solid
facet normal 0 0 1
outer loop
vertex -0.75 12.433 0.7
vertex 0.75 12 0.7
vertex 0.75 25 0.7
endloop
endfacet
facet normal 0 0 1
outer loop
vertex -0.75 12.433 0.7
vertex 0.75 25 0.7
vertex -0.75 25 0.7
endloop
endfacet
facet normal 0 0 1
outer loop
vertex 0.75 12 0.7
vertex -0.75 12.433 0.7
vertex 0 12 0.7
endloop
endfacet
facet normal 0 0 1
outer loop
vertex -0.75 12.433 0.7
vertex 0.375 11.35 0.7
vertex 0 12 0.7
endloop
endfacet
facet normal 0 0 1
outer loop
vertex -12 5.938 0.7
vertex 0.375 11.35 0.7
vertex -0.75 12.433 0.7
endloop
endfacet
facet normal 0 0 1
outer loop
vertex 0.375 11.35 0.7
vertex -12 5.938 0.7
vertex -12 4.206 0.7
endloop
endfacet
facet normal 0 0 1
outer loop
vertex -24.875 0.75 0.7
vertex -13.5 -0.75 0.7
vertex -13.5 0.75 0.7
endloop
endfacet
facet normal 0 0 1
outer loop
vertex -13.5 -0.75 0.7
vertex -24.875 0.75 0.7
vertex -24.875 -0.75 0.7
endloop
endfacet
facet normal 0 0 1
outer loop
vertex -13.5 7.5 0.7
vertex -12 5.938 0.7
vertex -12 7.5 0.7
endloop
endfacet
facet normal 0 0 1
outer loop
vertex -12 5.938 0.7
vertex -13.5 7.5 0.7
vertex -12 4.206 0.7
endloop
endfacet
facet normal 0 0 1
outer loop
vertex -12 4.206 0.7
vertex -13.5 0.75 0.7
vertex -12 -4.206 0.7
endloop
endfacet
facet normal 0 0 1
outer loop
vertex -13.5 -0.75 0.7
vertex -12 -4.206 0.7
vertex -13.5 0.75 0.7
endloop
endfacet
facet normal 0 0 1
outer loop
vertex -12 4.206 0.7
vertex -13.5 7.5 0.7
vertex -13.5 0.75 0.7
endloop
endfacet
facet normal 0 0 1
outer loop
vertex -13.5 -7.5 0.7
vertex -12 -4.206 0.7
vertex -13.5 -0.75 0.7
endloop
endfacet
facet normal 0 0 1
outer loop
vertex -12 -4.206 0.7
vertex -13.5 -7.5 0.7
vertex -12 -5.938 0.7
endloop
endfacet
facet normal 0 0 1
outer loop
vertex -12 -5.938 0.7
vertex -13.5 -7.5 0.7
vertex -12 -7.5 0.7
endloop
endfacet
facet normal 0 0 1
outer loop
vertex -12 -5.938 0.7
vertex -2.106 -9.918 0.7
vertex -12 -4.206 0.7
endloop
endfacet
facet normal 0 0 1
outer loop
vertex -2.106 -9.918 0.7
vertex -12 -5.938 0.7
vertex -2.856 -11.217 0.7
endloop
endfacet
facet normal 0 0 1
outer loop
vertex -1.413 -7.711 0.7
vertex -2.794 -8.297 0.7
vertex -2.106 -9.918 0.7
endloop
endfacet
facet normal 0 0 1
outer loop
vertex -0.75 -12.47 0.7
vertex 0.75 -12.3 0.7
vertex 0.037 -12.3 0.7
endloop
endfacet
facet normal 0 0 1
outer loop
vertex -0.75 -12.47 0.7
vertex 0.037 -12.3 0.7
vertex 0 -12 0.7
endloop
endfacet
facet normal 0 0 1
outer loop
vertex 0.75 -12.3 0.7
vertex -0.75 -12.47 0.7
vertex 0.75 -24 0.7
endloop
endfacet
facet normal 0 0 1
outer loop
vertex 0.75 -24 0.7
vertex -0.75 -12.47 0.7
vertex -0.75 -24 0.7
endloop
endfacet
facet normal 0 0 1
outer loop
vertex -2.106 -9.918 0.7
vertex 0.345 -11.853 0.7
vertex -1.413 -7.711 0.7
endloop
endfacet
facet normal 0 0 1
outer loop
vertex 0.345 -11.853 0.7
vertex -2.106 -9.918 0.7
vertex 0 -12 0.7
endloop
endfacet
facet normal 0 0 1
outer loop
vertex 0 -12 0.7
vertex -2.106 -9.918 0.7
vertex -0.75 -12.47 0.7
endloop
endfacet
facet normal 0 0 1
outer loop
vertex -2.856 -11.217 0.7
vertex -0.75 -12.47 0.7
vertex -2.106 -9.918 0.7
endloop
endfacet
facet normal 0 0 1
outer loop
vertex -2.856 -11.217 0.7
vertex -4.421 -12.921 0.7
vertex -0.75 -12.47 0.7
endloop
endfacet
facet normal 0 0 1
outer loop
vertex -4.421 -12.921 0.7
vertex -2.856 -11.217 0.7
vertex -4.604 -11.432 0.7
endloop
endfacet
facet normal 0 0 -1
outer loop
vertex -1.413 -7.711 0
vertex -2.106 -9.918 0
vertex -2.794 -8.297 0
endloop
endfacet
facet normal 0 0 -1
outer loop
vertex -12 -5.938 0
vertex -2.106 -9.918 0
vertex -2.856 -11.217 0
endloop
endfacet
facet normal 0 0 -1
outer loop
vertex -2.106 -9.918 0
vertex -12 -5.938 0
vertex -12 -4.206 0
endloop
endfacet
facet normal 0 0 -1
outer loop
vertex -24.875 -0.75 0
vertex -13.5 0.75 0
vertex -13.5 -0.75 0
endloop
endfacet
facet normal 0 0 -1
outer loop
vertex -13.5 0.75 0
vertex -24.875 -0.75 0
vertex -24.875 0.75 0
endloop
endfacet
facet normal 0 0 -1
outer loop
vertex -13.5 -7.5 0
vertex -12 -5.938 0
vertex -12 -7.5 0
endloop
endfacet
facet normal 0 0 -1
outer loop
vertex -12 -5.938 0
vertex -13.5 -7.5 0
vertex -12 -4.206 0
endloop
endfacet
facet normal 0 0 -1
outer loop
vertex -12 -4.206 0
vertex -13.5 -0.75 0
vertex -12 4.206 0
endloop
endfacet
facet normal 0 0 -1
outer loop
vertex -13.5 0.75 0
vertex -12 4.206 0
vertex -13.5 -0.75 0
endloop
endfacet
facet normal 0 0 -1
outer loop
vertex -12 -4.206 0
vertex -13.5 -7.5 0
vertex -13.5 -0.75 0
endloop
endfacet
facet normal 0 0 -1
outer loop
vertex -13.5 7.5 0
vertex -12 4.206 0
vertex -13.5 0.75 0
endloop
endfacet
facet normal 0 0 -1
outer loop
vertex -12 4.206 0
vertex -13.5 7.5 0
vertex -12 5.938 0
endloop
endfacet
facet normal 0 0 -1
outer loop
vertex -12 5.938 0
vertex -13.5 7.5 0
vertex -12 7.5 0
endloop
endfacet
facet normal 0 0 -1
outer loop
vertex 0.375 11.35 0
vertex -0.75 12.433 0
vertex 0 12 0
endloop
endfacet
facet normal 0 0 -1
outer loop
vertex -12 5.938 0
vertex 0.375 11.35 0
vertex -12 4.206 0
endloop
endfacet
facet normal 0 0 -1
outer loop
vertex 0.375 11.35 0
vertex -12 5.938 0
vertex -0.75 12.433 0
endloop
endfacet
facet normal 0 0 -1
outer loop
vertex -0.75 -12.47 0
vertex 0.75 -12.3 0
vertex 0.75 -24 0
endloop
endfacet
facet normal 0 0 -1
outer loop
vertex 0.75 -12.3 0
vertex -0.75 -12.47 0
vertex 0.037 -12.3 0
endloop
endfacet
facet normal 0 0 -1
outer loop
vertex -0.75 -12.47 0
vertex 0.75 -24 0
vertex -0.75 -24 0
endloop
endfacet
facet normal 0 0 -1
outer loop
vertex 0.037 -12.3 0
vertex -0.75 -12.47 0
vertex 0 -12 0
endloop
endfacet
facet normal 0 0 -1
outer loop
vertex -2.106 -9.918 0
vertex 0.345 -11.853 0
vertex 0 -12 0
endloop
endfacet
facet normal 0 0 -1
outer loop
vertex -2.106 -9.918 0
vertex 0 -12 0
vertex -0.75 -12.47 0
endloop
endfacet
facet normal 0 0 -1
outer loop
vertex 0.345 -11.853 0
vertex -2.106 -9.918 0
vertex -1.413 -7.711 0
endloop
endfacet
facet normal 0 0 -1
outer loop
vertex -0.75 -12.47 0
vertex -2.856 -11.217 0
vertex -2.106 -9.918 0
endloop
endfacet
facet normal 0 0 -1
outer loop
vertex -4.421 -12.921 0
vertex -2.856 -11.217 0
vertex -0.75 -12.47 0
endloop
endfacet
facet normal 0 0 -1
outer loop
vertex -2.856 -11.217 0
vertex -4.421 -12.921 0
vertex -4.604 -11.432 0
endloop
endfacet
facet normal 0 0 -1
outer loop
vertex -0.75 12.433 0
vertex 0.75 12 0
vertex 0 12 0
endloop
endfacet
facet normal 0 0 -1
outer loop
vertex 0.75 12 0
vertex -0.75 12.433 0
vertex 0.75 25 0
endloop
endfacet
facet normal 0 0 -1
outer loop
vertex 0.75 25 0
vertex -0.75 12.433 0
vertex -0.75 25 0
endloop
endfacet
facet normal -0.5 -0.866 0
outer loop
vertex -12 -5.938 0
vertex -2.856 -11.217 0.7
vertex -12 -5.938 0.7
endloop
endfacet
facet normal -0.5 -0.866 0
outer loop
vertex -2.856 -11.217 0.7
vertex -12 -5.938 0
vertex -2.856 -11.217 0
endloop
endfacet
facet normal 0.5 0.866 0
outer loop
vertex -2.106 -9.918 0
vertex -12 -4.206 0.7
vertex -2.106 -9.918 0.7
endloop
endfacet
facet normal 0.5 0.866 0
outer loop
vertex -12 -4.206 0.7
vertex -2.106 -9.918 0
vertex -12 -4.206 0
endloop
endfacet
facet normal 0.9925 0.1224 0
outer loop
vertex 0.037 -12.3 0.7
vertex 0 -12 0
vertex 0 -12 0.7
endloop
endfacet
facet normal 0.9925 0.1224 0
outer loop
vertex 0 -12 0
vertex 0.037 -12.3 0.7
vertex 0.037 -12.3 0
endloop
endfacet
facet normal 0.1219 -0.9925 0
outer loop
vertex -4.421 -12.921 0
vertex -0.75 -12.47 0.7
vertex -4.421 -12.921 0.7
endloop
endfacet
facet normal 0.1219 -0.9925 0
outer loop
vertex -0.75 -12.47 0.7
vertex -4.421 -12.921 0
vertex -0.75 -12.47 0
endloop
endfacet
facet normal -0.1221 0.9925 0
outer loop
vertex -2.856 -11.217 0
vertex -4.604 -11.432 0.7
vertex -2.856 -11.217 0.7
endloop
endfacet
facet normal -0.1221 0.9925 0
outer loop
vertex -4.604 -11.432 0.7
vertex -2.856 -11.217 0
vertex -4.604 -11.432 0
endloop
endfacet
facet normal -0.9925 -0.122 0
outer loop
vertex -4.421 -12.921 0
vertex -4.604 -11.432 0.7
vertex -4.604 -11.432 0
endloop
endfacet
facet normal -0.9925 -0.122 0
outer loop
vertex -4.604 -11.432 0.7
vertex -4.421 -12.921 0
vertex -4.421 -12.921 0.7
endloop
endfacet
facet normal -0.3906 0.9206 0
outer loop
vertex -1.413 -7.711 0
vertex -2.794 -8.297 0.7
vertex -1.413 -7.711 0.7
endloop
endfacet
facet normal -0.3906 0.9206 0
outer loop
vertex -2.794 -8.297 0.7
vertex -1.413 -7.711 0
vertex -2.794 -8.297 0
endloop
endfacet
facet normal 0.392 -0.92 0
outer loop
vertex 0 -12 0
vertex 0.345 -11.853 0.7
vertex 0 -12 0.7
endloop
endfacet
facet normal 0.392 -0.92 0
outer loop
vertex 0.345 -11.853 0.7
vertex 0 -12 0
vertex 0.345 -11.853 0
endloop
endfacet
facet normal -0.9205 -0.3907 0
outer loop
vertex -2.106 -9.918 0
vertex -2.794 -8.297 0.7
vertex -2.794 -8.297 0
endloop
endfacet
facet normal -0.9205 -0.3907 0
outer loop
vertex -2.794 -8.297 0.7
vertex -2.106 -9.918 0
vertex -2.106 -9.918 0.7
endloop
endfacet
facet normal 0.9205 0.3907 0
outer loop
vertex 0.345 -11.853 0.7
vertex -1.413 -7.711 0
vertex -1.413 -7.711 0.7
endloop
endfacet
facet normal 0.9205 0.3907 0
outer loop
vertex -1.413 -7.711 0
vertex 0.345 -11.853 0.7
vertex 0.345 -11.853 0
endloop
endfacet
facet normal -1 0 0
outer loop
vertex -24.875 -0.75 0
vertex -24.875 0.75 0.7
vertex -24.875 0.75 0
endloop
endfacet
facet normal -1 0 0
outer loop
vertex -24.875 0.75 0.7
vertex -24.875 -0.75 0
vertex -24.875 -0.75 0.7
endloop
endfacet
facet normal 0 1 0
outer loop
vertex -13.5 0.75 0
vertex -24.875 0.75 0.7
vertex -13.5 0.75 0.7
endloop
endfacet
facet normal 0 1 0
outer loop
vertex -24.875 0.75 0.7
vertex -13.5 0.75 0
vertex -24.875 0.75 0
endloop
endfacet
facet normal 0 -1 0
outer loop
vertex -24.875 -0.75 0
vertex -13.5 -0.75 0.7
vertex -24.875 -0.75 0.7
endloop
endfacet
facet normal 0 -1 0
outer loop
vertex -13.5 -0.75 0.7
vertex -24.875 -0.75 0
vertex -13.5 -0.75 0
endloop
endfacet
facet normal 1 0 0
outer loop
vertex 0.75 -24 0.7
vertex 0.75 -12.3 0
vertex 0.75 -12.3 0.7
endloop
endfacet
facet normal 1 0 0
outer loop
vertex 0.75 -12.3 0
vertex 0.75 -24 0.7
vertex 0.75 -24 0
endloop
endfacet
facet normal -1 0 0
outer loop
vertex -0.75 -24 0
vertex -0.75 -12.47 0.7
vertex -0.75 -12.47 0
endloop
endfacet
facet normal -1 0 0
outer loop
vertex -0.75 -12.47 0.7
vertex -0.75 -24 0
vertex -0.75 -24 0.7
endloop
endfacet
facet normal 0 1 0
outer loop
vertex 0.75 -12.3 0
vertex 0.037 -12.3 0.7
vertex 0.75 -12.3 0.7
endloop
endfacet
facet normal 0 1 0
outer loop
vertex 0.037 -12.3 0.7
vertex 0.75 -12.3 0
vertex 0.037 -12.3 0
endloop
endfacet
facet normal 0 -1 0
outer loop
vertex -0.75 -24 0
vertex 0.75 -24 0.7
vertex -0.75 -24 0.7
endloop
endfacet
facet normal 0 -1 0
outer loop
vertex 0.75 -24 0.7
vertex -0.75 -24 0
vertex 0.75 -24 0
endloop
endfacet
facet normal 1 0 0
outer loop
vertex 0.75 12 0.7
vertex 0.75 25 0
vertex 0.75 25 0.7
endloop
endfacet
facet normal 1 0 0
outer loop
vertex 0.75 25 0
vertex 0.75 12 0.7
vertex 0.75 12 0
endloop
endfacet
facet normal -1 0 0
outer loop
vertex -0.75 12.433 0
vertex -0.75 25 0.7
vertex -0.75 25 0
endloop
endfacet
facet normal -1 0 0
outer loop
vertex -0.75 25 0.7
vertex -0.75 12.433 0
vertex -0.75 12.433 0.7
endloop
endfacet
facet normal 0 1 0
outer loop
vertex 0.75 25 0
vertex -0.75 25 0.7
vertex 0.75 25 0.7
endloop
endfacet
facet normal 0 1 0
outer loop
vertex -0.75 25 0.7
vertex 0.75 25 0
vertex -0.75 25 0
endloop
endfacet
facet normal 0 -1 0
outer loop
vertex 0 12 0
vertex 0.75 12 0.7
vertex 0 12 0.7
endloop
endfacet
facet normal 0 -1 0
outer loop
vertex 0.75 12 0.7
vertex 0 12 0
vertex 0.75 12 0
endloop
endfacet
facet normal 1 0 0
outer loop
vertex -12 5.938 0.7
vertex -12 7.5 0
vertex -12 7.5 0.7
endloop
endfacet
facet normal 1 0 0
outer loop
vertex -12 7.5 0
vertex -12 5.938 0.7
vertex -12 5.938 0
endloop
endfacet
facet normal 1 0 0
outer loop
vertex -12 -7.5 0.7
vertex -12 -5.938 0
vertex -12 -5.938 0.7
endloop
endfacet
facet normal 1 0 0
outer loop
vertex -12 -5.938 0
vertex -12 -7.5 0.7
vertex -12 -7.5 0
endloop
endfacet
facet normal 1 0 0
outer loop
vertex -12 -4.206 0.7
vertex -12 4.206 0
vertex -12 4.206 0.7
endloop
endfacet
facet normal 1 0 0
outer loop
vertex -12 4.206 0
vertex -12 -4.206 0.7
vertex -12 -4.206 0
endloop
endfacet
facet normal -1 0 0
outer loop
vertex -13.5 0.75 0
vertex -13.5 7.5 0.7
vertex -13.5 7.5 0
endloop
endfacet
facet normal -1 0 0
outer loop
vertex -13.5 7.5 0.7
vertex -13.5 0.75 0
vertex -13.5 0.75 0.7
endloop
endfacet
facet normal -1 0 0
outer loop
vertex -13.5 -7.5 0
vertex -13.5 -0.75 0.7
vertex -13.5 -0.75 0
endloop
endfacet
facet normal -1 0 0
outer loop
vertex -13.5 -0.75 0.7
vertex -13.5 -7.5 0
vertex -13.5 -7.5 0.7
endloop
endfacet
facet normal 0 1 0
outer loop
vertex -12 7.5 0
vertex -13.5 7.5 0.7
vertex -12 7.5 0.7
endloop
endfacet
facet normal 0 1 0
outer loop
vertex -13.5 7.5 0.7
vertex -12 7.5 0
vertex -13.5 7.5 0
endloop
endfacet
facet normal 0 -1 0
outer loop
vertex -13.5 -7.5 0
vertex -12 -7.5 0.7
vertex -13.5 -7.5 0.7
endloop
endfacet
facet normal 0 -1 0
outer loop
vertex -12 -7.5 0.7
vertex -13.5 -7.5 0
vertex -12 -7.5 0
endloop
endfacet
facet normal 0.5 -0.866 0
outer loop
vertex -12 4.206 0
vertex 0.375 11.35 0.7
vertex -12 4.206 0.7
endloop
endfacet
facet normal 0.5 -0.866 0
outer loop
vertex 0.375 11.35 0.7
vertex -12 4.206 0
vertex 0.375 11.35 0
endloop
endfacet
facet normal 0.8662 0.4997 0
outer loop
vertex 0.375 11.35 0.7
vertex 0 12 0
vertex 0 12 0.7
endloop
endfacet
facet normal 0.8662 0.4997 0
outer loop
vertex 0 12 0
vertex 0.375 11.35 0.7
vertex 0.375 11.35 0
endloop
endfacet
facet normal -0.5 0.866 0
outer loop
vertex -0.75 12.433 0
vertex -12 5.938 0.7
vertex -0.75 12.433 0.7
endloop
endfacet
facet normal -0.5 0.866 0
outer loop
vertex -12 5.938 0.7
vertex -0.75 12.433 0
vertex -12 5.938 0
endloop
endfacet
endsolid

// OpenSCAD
// file: sym_arrow.scad
module arrow(thickness, length, size, height)
{
    translate([thickness,-thickness/2])cube([length-thickness, thickness, height]);
    rotate([0,0,37])translate([0,-3*thickness/4])cube([size, thickness, height]);
    rotate([0,0,-37])translate([0,-thickness/4])cube([size, thickness, height]);
}

//arrow(0.7, 20, 4.5, 1);
// file: sym_ring.scad
module ring(radius, thickness, height)
{
    difference()
    {
        cylinder(r=radius, h=height, $fn=64);
        translate([0,0,-thickness/2])cylinder(r=(radius-thickness), h=(height+thickness), $fn=64);
    }
}

ring(30, 1, 1);
// main file
use <sym_ring.scad>
use <sym_arrow.scad>
use <sym_ring.scad>

module transistor_npn(diameter, thickness, height)
{
    //ring(0.5*diameter, thickness, height);
    //base
    translate([-1.7*diameter/4-thickness/2,-diameter/4,0])
        cube([thickness, diameter/2, height]);

    //emitter
    translate([0, -diameter/2.5, 0])rotate([0,0,150])arrow(thickness, 4*diameter/8, 3*thickness, height);

    //collector
    translate([0, diameter/2.5, 0])rotate([0,0,120])translate([-thickness/2,0,0])cube([thickness, 4*diameter/8, height]);

    translate([-3*diameter/16-thickness/2, 0, 0])
    union()
    {
    //base wire
    translate([-2*diameter/3, 0,0])arrow(thickness, diameter/2.22, 0, height);
    
    //emitter wire 
    translate([3*diameter/16,-3*diameter/4-thickness,0])cube([thickness, 1.17*diameter/3, height]);
    
    //collector wire
    translate([3*diameter/16, 1.6*diameter/4,0])cube([thickness, 1.3*diameter/3, height]);
    }
}

transistor_npn(30, 1.5,0.7);
